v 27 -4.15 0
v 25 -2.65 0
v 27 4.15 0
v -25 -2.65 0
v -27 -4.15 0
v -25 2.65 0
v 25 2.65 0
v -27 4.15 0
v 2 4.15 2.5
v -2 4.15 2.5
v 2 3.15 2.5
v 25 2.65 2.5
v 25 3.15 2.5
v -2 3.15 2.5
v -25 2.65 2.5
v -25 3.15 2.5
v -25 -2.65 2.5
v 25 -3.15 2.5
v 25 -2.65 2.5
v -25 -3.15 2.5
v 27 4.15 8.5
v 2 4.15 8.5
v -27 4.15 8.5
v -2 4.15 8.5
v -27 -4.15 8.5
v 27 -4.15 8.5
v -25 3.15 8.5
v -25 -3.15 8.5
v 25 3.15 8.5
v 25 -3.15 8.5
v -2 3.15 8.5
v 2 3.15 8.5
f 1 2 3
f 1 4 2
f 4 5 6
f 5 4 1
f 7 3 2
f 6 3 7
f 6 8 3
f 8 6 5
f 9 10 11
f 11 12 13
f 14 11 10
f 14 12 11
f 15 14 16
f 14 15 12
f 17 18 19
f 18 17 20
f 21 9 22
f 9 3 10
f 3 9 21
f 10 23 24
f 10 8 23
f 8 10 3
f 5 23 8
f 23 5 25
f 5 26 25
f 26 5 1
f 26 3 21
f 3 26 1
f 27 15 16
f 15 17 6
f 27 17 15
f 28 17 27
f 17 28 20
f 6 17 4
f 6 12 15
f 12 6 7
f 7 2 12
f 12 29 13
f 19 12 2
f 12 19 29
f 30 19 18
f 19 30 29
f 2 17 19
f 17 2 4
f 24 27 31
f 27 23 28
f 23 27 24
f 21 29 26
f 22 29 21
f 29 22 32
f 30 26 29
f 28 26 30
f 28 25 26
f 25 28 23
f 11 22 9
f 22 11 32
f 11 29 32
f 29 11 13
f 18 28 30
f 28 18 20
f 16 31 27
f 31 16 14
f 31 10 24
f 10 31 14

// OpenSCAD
linear_extrude(2.5) {
    difference() {
        square([54,8.3],center=true);
        square([50,5.3],center=true);
    }
}
translate([0,0,2.5]) {
linear_extrude(6) {
    difference() {
        square([54,8.3],center=true);
        union() {
            square([50,6.3],center=true);
            translate([0,4,0])
                square([4,3],center=true);
        }
    }
}
}
